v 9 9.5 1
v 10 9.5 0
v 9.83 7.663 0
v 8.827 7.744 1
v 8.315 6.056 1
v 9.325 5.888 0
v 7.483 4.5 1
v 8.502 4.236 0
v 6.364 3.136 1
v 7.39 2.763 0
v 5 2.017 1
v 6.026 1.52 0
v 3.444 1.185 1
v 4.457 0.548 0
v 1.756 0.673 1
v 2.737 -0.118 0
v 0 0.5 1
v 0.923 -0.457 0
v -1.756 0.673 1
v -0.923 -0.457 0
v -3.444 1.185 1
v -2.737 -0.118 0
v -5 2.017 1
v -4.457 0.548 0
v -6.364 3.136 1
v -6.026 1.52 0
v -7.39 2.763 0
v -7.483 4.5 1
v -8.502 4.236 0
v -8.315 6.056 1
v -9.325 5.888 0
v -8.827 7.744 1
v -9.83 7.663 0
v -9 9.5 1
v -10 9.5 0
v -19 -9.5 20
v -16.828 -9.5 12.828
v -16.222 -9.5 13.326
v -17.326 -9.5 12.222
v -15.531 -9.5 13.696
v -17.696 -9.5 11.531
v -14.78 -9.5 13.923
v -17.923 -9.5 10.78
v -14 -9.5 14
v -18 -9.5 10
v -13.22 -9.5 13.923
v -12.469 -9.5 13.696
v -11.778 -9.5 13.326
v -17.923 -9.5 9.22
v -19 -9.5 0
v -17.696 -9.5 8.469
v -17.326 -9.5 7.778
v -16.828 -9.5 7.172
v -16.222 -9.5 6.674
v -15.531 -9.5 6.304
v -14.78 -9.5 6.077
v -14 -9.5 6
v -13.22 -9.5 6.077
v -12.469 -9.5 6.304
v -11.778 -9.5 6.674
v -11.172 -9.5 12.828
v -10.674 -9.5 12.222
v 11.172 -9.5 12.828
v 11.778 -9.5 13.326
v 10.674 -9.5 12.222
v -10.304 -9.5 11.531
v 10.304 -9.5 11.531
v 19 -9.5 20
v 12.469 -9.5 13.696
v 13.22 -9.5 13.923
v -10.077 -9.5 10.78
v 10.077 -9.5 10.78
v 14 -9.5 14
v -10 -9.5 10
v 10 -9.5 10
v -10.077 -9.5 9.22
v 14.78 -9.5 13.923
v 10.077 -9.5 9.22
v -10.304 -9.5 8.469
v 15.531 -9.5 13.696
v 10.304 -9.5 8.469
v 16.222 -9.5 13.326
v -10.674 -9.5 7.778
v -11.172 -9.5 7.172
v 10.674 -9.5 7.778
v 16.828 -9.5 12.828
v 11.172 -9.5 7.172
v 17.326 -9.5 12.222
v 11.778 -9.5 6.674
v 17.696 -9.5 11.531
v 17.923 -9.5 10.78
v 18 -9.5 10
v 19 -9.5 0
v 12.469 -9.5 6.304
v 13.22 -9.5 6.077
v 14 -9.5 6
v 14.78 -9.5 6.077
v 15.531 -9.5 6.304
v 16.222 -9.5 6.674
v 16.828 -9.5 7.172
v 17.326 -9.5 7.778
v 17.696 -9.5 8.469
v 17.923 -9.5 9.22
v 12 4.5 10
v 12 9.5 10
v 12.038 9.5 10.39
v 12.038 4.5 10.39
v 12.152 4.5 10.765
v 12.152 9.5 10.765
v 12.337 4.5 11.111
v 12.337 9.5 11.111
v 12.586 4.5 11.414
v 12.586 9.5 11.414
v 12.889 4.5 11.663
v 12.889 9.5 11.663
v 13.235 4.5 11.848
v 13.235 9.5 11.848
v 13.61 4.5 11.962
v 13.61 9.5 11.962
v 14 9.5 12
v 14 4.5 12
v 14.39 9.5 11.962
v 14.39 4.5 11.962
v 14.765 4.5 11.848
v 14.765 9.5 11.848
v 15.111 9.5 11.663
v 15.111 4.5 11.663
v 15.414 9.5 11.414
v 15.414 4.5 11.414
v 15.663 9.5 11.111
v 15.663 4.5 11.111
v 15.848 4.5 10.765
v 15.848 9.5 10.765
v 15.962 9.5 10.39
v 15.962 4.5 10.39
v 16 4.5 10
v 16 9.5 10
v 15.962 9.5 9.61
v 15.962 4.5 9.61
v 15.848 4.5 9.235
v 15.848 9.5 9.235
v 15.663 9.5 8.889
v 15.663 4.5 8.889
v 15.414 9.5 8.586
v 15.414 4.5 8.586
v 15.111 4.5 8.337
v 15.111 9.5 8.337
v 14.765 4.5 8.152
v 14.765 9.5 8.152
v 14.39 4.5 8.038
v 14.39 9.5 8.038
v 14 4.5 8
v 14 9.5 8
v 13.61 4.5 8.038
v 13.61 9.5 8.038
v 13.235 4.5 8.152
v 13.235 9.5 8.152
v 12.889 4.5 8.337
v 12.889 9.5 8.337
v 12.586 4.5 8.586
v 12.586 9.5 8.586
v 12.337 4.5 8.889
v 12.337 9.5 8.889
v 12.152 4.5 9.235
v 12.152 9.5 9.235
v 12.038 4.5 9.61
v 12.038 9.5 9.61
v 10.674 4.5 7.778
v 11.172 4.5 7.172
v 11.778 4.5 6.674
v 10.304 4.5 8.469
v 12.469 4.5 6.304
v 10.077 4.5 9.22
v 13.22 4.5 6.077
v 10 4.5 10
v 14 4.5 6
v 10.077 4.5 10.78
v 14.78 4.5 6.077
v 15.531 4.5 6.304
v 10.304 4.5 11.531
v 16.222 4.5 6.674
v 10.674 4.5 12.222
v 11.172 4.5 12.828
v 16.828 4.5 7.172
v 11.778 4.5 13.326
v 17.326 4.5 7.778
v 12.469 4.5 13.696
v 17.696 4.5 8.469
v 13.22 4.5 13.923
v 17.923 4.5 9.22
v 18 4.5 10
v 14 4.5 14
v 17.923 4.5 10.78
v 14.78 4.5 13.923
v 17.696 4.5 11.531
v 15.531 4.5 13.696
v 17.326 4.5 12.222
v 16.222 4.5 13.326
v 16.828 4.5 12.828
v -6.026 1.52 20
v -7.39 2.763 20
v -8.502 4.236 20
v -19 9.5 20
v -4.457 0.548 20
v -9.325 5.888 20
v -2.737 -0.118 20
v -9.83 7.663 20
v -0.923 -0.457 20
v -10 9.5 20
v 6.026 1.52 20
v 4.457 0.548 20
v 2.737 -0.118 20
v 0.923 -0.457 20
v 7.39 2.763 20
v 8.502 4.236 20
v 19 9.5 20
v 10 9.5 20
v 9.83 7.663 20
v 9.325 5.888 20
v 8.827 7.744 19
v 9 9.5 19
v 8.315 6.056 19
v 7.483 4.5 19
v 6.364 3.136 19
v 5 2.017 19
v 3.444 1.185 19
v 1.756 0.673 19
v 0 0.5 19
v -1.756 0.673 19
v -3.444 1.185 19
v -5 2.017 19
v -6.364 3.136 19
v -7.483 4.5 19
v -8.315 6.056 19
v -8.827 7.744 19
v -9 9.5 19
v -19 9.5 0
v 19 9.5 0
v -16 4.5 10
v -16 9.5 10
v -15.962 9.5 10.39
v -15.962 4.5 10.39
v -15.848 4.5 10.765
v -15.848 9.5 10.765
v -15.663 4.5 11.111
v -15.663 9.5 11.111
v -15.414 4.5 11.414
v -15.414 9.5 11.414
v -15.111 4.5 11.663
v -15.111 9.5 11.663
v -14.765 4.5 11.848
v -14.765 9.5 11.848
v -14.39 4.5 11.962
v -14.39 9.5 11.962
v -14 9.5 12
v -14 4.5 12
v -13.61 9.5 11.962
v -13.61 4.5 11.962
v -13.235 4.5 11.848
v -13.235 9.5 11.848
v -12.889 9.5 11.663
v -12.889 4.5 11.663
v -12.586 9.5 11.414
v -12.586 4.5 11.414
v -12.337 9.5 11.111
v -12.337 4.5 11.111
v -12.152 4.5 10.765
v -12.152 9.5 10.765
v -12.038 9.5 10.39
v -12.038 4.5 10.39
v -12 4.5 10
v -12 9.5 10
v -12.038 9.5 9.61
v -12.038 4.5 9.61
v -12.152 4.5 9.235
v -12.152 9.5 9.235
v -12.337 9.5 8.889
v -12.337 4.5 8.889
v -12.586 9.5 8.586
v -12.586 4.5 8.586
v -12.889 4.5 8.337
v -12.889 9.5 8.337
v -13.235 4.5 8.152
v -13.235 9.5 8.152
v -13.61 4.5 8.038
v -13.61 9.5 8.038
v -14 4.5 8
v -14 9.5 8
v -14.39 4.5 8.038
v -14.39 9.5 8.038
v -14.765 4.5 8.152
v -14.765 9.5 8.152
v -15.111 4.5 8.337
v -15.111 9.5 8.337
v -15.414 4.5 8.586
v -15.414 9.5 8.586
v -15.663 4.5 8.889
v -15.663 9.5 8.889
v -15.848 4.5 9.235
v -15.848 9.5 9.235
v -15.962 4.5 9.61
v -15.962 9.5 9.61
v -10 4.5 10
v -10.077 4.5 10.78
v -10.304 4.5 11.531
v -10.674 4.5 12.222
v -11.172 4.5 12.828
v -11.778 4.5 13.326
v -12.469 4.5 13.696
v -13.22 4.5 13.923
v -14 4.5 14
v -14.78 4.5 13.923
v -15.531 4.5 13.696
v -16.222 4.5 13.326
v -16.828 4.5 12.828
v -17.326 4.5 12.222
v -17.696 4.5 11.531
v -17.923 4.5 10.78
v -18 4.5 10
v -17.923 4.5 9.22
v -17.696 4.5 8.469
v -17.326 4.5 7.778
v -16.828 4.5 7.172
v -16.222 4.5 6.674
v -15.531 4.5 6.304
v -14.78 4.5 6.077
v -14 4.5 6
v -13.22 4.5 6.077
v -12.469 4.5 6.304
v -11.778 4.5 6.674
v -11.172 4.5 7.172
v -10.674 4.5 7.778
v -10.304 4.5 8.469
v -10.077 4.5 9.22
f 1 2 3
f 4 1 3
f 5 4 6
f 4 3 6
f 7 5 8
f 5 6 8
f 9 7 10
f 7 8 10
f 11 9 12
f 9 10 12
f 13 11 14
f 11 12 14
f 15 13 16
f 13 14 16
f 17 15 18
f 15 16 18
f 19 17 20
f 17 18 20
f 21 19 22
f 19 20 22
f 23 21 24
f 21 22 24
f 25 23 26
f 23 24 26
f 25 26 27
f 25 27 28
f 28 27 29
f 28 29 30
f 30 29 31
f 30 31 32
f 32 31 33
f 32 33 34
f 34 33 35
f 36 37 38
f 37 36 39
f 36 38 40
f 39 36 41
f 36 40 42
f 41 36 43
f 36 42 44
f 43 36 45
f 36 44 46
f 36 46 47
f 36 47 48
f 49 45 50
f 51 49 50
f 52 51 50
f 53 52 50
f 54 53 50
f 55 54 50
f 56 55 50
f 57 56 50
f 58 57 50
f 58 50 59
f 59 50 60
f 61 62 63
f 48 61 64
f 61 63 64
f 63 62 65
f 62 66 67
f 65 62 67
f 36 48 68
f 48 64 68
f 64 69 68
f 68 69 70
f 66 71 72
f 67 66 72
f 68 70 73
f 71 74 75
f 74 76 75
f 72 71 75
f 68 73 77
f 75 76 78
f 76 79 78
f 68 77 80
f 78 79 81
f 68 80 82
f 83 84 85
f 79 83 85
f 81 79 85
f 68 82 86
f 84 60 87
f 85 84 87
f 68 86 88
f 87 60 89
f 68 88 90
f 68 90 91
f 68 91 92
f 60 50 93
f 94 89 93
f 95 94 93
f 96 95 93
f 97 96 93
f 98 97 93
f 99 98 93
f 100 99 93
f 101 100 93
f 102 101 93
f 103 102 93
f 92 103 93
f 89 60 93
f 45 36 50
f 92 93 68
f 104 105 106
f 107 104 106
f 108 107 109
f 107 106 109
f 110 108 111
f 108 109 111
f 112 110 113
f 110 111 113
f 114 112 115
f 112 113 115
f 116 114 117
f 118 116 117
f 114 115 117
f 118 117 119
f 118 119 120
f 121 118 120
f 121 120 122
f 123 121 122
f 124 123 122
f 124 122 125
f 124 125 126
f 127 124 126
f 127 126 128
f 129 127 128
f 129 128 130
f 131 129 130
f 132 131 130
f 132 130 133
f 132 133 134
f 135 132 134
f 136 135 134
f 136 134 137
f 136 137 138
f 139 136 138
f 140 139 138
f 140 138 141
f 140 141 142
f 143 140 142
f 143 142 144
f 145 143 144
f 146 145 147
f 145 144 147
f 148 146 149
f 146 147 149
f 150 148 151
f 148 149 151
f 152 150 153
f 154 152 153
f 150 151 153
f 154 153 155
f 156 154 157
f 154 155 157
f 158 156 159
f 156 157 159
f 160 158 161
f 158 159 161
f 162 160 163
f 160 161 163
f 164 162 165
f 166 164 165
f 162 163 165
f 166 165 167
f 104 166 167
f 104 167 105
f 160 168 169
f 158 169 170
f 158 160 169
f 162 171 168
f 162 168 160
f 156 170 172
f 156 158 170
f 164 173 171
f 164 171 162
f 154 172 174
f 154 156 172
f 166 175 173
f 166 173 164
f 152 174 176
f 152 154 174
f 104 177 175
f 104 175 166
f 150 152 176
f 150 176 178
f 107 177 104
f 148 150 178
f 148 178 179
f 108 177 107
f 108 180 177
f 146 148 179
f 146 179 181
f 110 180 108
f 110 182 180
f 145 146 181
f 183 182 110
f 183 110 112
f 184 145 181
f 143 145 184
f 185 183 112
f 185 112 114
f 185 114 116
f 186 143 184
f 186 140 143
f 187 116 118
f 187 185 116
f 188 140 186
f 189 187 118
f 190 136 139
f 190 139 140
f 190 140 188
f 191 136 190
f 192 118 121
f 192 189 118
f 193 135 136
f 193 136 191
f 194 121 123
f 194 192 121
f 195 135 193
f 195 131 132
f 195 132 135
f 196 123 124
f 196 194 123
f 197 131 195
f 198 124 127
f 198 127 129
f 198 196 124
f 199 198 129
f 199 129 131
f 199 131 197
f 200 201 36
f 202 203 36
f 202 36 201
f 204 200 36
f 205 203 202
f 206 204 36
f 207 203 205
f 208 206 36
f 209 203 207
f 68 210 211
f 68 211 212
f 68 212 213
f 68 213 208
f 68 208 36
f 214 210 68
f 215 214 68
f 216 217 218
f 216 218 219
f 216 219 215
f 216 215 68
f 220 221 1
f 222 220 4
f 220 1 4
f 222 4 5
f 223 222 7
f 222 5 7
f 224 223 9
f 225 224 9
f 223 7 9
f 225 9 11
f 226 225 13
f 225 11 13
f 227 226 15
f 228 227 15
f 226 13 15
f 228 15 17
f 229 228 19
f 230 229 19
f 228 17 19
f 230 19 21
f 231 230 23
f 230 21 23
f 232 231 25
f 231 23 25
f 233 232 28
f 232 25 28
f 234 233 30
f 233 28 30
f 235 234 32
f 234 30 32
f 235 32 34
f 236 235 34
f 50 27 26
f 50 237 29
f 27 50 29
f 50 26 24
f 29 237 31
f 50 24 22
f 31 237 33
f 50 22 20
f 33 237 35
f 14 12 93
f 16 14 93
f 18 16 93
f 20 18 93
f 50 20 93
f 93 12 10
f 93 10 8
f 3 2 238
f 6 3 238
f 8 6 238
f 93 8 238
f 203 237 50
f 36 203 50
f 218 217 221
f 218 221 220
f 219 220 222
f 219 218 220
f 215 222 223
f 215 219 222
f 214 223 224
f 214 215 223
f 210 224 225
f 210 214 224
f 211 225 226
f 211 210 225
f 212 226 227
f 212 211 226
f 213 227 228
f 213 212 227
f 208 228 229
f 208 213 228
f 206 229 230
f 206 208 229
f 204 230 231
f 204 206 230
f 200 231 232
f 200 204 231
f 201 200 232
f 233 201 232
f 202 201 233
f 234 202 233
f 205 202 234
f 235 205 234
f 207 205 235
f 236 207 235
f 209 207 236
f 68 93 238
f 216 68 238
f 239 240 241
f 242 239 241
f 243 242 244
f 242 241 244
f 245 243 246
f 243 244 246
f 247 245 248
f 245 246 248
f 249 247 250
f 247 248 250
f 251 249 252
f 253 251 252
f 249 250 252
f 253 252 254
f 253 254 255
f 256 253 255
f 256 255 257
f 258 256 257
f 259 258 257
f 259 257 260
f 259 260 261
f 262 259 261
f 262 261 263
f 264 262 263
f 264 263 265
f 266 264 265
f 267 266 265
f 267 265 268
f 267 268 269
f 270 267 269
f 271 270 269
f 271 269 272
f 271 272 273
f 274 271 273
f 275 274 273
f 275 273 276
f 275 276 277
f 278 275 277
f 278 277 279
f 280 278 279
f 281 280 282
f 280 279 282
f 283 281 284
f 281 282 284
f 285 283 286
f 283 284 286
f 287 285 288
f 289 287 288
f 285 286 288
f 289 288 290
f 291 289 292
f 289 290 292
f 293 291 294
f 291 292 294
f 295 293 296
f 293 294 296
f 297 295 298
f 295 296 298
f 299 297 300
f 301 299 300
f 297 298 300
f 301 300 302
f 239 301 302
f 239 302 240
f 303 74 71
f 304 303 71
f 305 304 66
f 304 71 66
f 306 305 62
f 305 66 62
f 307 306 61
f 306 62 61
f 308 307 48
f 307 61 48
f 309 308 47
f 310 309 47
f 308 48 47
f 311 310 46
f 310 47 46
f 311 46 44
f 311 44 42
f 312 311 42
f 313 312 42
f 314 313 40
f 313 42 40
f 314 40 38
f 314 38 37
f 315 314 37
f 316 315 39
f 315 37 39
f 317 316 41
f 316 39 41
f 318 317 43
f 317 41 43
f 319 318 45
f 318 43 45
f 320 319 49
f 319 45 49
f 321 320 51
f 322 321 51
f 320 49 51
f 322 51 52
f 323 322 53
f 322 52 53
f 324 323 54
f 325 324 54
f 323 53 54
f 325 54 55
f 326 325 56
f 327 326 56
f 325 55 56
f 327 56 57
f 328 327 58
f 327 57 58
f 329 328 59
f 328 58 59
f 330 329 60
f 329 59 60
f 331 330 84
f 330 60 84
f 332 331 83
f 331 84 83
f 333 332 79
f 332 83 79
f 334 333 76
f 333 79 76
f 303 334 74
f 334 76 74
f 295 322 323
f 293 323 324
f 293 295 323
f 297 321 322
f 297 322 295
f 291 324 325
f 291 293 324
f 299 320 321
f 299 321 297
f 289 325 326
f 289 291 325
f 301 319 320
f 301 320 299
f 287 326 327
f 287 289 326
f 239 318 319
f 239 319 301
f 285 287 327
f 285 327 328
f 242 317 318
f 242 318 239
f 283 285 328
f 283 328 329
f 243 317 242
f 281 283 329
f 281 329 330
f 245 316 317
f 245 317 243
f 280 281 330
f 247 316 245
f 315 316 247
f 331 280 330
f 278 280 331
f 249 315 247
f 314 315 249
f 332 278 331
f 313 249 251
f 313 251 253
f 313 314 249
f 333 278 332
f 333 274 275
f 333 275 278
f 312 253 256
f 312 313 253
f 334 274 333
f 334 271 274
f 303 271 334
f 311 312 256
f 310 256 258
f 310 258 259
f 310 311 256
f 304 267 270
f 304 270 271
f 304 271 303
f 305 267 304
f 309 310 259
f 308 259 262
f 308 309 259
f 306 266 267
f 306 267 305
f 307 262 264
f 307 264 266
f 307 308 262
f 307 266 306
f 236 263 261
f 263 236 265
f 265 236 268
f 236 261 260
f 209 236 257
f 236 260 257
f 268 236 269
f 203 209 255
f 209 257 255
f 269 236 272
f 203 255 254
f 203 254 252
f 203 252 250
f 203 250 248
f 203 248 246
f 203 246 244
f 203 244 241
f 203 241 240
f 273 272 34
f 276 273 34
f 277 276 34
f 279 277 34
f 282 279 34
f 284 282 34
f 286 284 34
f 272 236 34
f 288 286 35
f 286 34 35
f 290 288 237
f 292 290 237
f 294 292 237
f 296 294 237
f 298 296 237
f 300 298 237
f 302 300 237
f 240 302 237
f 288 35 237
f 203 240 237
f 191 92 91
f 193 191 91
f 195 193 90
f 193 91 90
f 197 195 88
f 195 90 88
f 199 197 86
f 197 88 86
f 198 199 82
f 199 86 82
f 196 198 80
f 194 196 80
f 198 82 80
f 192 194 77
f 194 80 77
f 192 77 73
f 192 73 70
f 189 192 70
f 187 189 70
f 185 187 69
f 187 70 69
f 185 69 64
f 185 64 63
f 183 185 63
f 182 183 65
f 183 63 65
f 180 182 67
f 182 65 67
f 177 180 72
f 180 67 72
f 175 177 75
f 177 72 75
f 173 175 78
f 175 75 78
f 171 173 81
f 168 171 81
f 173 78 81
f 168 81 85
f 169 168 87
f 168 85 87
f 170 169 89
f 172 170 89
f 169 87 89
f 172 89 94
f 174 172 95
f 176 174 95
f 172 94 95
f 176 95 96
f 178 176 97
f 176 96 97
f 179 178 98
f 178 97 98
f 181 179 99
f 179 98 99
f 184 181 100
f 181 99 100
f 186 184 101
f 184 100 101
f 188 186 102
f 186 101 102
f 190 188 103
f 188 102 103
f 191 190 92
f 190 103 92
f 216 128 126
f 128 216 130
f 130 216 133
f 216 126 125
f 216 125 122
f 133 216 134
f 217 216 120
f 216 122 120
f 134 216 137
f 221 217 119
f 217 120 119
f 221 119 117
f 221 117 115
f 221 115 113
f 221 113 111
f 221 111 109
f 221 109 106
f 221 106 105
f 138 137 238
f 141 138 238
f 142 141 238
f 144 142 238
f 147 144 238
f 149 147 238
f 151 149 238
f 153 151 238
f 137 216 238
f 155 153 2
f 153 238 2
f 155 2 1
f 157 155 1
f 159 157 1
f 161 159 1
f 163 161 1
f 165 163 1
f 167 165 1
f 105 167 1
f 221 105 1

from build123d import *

# Parameters (mm, degrees)
F1_DEPTH = 20
F2_R     = 2
F3_DEPTH = 19.001
F4_R     = 4
F5_DEPTH = 14
F6_SIZE  = 1


with BuildPart() as f1:
    # F0 (on Top) → F1 (new body)
    with BuildSketch(Plane.XY):
        with BuildLine():
            Line((-9, 9.5), (-19, 9.5))
            Line((-19, 9.5), (-19, -9.5))
            Line((-19, -9.5), (19, -9.5))
            Line((19, -9.5), (19, 9.5))
            Line((19, 9.5), (9, 9.5))
            ThreePointArc((9, 9.5), (0, 0.5), (-9, 9.5))
        make_face()
    extrude(amount=F1_DEPTH)

    # F2 (on face) → F3 (cut, through all)
    with BuildSketch(Plane(origin=(0, 9.5, 0), x_dir=(-1, 0, 0), z_dir=(0, 1, 0))):
        with Locations((-14, 10)):
            Circle(F2_R)
        with Locations((14, 10)):
            Circle(F2_R)
    extrude(amount=-F3_DEPTH, mode=Mode.SUBTRACT)

    # F4 (on face) → F5 (cut)
    with BuildSketch(Plane.XZ.offset(9.5)):
        with Locations((-14, 10)):
            Circle(F4_R)
        with Locations((14, 10)):
            Circle(F4_R)
    extrude(amount=-F5_DEPTH, mode=Mode.SUBTRACT)

    # F6
    f6_edges = [f1.edges().sort_by_distance(p)[0] for p in [
        (0, 0.5, 0),
        (0, 0.5, 20),
    ]]
    chamfer(f6_edges, length=F6_SIZE)


solid = f1.part
